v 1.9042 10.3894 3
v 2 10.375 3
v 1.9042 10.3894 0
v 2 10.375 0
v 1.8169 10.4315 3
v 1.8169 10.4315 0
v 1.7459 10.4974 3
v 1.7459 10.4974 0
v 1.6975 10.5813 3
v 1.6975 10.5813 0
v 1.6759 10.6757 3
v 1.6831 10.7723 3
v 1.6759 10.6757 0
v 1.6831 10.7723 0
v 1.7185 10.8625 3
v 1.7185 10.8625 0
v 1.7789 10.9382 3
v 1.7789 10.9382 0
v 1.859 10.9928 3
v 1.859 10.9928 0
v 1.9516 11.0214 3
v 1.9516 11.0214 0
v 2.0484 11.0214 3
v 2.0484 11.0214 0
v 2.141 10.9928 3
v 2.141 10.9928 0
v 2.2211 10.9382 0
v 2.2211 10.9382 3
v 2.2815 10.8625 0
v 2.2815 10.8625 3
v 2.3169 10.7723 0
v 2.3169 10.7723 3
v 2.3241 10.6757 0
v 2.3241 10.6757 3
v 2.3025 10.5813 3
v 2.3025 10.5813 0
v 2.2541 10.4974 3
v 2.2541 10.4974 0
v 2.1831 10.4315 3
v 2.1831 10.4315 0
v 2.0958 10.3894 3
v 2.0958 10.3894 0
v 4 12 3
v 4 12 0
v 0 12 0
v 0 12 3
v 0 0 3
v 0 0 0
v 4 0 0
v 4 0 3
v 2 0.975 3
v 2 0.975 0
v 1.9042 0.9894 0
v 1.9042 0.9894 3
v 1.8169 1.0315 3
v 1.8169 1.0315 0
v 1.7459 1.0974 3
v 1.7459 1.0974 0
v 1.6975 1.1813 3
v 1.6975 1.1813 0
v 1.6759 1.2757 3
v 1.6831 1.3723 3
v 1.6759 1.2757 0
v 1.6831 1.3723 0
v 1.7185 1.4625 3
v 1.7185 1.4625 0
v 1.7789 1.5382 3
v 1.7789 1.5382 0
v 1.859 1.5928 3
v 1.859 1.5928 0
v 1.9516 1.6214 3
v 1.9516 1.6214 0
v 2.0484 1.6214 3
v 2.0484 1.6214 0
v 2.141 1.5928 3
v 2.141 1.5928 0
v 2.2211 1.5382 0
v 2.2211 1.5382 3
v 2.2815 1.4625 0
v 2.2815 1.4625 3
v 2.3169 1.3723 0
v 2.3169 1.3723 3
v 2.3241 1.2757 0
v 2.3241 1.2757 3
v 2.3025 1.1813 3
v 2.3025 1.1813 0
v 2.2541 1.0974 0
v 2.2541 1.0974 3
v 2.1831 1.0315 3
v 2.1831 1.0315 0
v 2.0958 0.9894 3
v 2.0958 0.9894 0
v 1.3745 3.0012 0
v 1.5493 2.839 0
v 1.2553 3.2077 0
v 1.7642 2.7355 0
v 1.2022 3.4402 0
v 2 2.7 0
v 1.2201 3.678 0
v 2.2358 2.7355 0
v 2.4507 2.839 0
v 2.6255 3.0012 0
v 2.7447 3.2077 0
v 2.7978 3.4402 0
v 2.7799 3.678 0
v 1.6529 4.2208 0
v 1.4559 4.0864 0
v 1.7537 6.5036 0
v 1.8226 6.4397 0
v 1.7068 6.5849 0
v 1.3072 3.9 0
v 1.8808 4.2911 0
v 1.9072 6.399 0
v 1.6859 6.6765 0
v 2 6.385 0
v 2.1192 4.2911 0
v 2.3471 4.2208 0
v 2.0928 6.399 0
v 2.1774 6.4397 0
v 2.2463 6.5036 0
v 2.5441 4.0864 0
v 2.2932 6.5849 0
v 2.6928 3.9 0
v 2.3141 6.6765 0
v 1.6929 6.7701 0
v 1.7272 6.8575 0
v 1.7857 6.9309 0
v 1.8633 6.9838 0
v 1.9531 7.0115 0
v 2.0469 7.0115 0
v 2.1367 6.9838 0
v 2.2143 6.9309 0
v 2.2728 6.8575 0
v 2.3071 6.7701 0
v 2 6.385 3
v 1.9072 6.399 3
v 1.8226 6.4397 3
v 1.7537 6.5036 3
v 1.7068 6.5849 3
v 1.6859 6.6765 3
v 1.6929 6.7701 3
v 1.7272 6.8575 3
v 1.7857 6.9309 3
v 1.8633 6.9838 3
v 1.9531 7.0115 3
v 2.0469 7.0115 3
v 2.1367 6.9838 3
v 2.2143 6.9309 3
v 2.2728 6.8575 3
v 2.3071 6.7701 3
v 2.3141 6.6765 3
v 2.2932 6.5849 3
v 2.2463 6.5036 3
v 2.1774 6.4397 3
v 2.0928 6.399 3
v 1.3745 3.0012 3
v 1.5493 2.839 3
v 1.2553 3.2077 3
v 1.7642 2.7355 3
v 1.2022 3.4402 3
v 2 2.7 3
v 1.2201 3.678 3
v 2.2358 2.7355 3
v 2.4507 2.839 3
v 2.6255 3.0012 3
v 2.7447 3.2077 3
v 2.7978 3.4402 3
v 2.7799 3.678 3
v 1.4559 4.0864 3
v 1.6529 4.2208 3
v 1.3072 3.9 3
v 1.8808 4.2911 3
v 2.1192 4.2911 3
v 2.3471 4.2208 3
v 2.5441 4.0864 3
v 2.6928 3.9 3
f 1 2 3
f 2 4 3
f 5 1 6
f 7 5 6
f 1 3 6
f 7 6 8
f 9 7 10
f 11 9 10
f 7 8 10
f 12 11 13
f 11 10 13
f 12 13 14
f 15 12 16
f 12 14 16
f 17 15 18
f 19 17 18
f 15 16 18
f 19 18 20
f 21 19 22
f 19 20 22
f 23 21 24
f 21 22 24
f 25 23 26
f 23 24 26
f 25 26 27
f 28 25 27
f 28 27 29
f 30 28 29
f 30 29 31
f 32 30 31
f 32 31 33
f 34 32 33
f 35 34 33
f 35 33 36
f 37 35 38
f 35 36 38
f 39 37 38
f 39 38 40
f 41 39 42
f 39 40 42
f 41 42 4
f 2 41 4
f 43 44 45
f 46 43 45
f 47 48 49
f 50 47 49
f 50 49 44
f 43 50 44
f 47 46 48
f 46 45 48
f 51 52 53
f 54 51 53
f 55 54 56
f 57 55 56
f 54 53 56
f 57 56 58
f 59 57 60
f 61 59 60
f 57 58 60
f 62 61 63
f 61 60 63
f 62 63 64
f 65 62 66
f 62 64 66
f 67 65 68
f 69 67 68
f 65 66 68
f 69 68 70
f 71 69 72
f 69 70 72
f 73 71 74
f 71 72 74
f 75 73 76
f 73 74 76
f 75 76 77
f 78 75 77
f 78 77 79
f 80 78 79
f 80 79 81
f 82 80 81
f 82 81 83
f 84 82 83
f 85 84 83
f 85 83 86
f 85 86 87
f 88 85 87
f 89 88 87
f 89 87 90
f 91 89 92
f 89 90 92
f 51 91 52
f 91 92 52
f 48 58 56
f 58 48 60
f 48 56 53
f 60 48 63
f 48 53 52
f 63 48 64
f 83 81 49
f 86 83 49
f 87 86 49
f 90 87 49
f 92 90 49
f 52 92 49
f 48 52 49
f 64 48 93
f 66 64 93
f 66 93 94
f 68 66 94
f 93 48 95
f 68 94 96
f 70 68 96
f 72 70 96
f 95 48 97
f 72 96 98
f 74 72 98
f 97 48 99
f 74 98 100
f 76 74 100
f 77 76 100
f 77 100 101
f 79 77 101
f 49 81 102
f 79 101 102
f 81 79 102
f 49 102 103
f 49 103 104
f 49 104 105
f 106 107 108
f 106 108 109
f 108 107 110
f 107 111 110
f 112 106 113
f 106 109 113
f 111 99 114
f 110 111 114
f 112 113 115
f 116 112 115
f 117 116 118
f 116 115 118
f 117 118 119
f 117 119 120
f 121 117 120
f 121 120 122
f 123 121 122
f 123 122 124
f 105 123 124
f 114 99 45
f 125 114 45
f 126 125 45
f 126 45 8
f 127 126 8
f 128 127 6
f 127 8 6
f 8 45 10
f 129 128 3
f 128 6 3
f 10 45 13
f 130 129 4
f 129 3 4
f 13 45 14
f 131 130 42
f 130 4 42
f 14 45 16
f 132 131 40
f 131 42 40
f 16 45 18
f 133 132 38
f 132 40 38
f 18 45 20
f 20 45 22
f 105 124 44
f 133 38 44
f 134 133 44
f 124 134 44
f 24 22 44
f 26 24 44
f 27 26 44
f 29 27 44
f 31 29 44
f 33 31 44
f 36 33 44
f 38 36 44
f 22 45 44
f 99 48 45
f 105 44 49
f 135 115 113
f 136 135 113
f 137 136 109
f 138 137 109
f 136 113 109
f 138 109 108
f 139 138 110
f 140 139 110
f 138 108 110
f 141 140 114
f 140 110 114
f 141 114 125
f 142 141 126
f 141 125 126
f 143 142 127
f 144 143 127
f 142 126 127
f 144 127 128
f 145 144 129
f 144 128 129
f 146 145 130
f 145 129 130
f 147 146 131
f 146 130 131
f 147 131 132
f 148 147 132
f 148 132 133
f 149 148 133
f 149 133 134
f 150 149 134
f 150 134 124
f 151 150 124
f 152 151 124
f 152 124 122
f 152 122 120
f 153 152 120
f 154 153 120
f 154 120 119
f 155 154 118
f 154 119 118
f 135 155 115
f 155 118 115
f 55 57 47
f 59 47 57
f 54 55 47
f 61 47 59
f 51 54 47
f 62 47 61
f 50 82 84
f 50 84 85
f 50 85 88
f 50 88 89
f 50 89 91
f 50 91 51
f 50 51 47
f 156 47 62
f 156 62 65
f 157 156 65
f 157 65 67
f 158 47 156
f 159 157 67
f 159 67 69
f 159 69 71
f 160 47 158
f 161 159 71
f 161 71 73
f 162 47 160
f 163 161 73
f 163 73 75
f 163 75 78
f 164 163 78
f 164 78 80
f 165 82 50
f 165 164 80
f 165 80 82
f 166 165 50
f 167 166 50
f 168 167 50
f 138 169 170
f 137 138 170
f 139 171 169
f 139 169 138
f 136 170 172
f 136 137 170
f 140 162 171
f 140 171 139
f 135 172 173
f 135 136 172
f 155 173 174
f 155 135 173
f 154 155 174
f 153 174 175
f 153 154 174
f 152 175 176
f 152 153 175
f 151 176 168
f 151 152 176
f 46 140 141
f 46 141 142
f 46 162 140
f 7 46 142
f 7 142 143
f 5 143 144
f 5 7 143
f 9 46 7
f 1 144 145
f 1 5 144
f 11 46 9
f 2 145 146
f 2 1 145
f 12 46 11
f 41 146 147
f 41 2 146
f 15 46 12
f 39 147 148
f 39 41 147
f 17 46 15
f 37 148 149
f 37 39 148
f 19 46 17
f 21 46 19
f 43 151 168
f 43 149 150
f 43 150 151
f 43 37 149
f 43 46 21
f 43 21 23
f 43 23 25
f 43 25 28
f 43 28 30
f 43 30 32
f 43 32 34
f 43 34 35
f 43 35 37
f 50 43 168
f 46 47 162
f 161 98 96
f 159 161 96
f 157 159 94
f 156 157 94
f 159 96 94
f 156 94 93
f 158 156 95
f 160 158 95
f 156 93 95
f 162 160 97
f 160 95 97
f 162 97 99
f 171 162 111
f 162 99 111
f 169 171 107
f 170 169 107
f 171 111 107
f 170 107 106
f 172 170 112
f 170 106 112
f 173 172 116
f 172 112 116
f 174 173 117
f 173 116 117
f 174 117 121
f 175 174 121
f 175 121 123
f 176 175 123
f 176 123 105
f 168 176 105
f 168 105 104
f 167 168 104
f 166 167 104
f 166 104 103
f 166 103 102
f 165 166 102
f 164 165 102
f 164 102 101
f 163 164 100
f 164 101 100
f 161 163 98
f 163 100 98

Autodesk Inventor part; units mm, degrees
ref_plane "YZ Plane" through (0, 0, 0) normal (1, 0, 0) x (0, 1, 0)
ref_plane "XZ Plane" through (0, 0, 0) normal (0, 1, 0) x (-1, 0, 0)
ref_plane "XY Plane" through (0, 0, 0) normal (0, 0, 1) x (1, 0, 0)
sketch "스케치1" plane through (0, 0, 0) normal (0, 0, 1) x (1, 0, 0)
  line L0 (0, 0) -> (4, 0)
  line L1 (4, 0) -> (4, 12)
  line L2 (4, 12) -> (0, 12)
  line L3 (0, 12) -> (0, 0)
  dimension "d0" = 4
  dimension "d1" = 12
extrude "돌출1" add sketch "스케치1" along normal blind 3
sketch "스케치2" plane through (0, 0, 3) normal (0, 0, 1) x (1, 0, 0)
  line L0 (4, 12) -> (0, 12) construction
  line L1 (2, 12) -> (2, 0) construction
  line L2 (0, 0) -> (4, 0) construction
  line L3 (4, 0) -> (4, 12) projected
  line L4 (0, 12) -> (0, 0) projected
  point P0 (2, 6.7)
  point P1 (2, 3.5)
  point P2 (2, 1.3)
  point P3 (2, 10.7)
  dimension "d45" = 1.3
  dimension "d52" = 2.2
  dimension "d55" = 1.3
  dimension "d57" = 3.2
hole "구멍1" at (2, 6.7, 3) direction (0, 0, -1) diameter 0.63 end through all
hole "구멍2" at (2, 3.5, 3) direction (0, 0, -1) diameter 1.6 end through all
hole "구멍3" at (2, 1.3, 3) at (2, 10.7, 3) direction (0, 0, -1) diameter 0.65 end through all
equation "\"G23_M\" = 0.67"
equation "\"G23_F\" = 0.65"
properties part number "Top" material "유리"
